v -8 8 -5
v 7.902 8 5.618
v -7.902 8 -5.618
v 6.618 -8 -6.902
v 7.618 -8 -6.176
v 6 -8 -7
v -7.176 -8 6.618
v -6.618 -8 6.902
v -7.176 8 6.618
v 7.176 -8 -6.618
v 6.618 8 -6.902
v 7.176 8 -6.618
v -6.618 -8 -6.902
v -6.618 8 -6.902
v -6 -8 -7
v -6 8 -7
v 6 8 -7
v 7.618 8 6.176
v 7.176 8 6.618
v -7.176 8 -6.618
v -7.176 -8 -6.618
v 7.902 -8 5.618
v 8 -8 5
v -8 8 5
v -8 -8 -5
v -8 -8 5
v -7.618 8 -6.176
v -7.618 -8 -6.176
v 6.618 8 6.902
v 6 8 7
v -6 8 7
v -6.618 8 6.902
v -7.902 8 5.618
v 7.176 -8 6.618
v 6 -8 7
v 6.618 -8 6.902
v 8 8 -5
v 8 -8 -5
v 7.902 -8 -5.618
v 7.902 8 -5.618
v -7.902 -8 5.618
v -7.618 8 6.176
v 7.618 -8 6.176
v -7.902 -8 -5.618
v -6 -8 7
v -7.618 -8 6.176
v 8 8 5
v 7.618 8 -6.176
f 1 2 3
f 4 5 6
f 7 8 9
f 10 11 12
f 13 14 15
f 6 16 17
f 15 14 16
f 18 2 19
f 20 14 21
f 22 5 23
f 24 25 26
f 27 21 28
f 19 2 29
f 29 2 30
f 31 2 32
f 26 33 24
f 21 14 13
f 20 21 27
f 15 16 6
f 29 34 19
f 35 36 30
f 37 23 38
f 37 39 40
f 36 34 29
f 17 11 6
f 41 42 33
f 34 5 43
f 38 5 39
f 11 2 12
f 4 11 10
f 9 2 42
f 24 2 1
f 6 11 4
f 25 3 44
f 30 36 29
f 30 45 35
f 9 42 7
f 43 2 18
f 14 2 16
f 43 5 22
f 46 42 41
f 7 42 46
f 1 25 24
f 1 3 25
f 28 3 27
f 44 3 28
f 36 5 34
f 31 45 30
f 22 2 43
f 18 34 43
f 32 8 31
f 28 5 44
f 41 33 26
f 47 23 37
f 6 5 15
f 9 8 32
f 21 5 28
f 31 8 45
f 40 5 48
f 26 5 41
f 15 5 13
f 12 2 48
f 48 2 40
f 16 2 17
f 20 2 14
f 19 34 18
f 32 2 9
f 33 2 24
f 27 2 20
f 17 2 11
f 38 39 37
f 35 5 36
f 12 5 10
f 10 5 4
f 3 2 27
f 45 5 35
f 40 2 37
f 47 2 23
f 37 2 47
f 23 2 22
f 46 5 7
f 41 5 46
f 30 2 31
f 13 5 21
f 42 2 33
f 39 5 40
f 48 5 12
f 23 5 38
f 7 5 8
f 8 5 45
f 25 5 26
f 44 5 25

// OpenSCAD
// file: ../../lib/pcb.scad
module prism(l, w, h) {
    translate([-0.5*l,0, -0.5*h])
    rotate([0,0,-90])
       polyhedron(points=[
               [0,0,h],           // 0    front top corner
               [0,0,0],[w,0,0],   // 1, 2 front left & right bottom corners
               [0,l,h],           // 3    back top corner
               [0,l,0],[w,l,0]    // 4, 5 back left & right bottom corners
       ], faces=[ // points for all faces must be ordered clockwise when looking in
               [0,2,1],    // top face
               [3,4,5],    // base face
               [0,1,4,3],  // h face
               [1,2,5,4],  // w face
               [0,3,5,2],  // hypotenuse face
       ]);
}

/*
module holder(holderLength, holderHeight, holderThickness, holderPrismWidth, holderPrismHeight, holderPlateHeight){
    translate([0,0, 0])
        cube([holderLength, holderThickness, holderHeight], center=true);
    
    translate([0, -0.5*(holderPrismWidth-holderThickness), 0.5*(holderHeight + holderPlateHeight)])
        cube([holderLength, holderPrismWidth, holderPlateHeight], center=true);

    translate([0, 0.5*holderThickness, 0.5*(holderHeight + holderPrismHeight) + holderPlateHeight]){
        prism(holderLength, holderPrismWidth, holderPrismHeight);
    }   
    
}
*/

module holder(holderLength, holderHeight, holderThickness, holderPrismWidth, holderPrismHeight, holderPlateHeight){
    translate([0,0, 0])
        cube([holderLength, holderThickness, holderHeight], center=true);
    
    translate([0, -0.5*(holderPrismWidth-holderThickness), 0.5*(holderHeight + holderPlateHeight)])
        cube([holderLength, holderPrismWidth, holderPlateHeight], center=true);
    
    translate([0,0.5*holderThickness, 0.5*(holderHeight)]){
        translate([0,0, holderPlateHeight + 0.5* + holderPrismHeight])
        prism(holderLength, holderPrismWidth, holderPrismHeight);
        
        
        translate([0, -holderThickness , -0.125*holderPrismHeight])
            rotate([0,180,0])
                prism(holderLength, holderPrismWidth-holderThickness, 0.25*holderPrismHeight);
    }   
    
}

module pcb(
    pcbDimensions = [30, 20, 3],
    holderThickness = 1.2,
    
    holderLength = 8,
    holderPlateHeight = 0.2,
    platerSize = 3,
    platerHeight = 2
){    
    holderPrismHeight = 1;
    holderPrismWidth = 0.5 * holderPrismHeight + holderThickness;
    holderHeight = pcbDimensions[2] + platerHeight;

    
        translate([0, 0.5 * (pcbDimensions[1] + holderThickness), 0.5*holderHeight]){
            holder(holderLength, holderHeight, holderThickness, holderPrismWidth, holderPrismHeight, holderPlateHeight);
        }   
        
        translate([0, -0.5 * (pcbDimensions[1] + holderThickness), 0.5*holderHeight]){
            rotate([0, 0, 180])
                holder(holderLength, holderHeight, holderThickness, holderPrismWidth, holderPrismHeight, holderPlateHeight);
        }
        
        translate([0.5*(pcbDimensions[0] + holderThickness), 0, 0.5*holderHeight]){
            rotate([0, 0, -90])
                holder(holderLength, holderHeight, holderThickness, holderPrismWidth, holderPrismHeight, holderPlateHeight);
        }
        
        translate([-0.5*(pcbDimensions[0] + holderThickness), 0, 0.5*holderHeight]){
            rotate([0, 0, 90]){
                holder(holderLength, holderHeight, holderThickness, holderPrismWidth, holderPrismHeight, holderPlateHeight);
            }
        }
        
        translate([-0.5 * (pcbDimensions[0] - platerSize) - holderThickness, 0.5 * (platerSize - pcbDimensions[1]) - holderThickness, 0.5*platerHeight]){
            cube([platerSize, platerSize, platerHeight], center=true);
        }
        
        translate([0.5 * (pcbDimensions[0] - platerSize) + holderThickness, 0.5 * (platerSize - pcbDimensions[1]) - holderThickness, 0.5*platerHeight]){
            cube([platerSize, platerSize, platerHeight], center=true);
        }
        
        translate([-0.5 * (pcbDimensions[0] - platerSize) - holderThickness, -0.5 * (platerSize - pcbDimensions[1]) + holderThickness, 0.5*platerHeight]){
            cube([platerSize, platerSize, platerHeight], center=true);
        }
        
        translate([0.5 * (pcbDimensions[0] - platerSize) + holderThickness, -0.5 * (platerSize - pcbDimensions[1]) + holderThickness, 0.5*platerHeight]){
            cube([platerSize, platerSize, platerHeight], center=true);
        }
    
}
// file: ../../lib/svg3d.scad
module svg3d(file, orgWidth, orgHeight, depth, size, center = true){
    translate([0, 0, -0.5*depth])
    //scale([size, size, 1])
        //surface(file = file, center = true, invert = true);
        
        
        linear_extrude(depth) {
            scale([size, size, 0])
            translate([-0.5*orgWidth, -0.5*orgHeight, 0])
                import(file);
        }
        
    
}
// file: ../../lib/text3d.scad
module text3d(text, textDepth, textSize, textFont, textSpacing, center = true){
    translate([0,0,-0.5*textDepth])
        linear_extrude(textDepth) {
            text(text, size = textSize, font = textFont, spacing = textSpacing, halign = "center", valign = "center", $fn = 64);
        }
}
// file: ../../lib/base.scad
use <shapes.scad>;

module base(
    objectSize, 
    height, 
    sideAdjustment, 
    baseRounding, 
    roundingRadius, 
    roundingResolution,
    withPit,
    pitWallThickness,
    pitDepth,
    pitWallGaps,
){
    //Variables for cutouts        
    cutOffset = 0.2;
    cutMultiplier = 1.1;
    cutTolerance = 0.01;

    //Object Size Adjusted      
    objectSizeXAdjusted = objectSize[0] + sideAdjustment[0] + sideAdjustment[1];
    objectSizeYAdjusted = objectSize[1] + sideAdjustment[2] + sideAdjustment[3];

    size = [objectSizeXAdjusted, objectSizeYAdjusted, height];

    function sideX(side) = 0.5 * (sideAdjustment[1] - sideAdjustment[0]) + (side - 0.5) * objectSizeXAdjusted;
    function sideY(side) = 0.5 * (sideAdjustment[3] - sideAdjustment[2]) + (side - 0.5) * objectSizeYAdjusted;

    difference(){
        translate([0.5*(sideAdjustment[1] - sideAdjustment[0]), 0.5*(sideAdjustment[3] - sideAdjustment[2]), 0]){
            if(baseRounding == "none"){
                cube(
                    size = size, 
                    center = true
                );    
            }
            else if(baseRounding == "all"){
                mb_roundedcube_simple(
                    size = size, 
                    center = true, 
                    radius = roundingRadius, 
                    resolution = roundingResolution
                );    
            }
            else{
                mb_roundedcube(
                    size = size, 
                    center = true, 
                    radius = roundingRadius, 
                    apply_to = baseRounding,
                    resolution = roundingResolution
                );
            }
        }

        /*
        * Pit
        */
        if(withPit){
            pitSizeX = objectSize[0] - pitWallThickness[0] - pitWallThickness[1];
            pitSizeY = objectSize[1] - pitWallThickness[2] - pitWallThickness[3];
            echo(pitSizeX = pitSizeX, pitSizeY = pitSizeY, pitDepth = pitDepth, pitWallThickness = pitWallThickness);

            translate([0.5*(pitWallThickness[1] - pitWallThickness[0]), 0.5*(pitWallThickness[3] - pitWallThickness[2]), 0.5 * (height - pitDepth) + 0.5 * cutOffset])
                cube([pitSizeX, pitSizeY, pitDepth + cutOffset], center = true);
        
            for (gapIndex = [ 0 : 1 : len(pitWallGaps)-1 ]){
                gap = pitWallGaps[gapIndex];
                if(gap[0] < 2){
                    translate([sideX(gap[0]), -0.5 * (gap[2] - gap[1]), 0.5*(height - pitDepth + cutOffset)])
                        cube([2*pitWallThickness[gap[0]]*cutMultiplier, pitSizeY - gap[1] - gap[2], pitDepth + cutOffset], center = true);
                }  
                else{
                    translate([-0.5 * (gap[2] - gap[1]), sideY(gap[0] - 2), 0.5*(height - pitDepth + cutOffset)])
                        cube([pitSizeX - gap[1] - gap[2] , 2*pitWallThickness[gap[0]]*cutMultiplier, pitDepth + cutOffset], center = true);     
                } 
            }
        }
    }
}
// file: ../../lib/shapes.scad
// More information: https://danielupshaw.com/openscad-rounded-corners/

// Set to 0.01 for higher definition curves (renders slower)
$fs = 0.15;

module mb_roundedcube(size = [1, 1, 1], center = false, radius = 0.5, apply_to = "all", resolution = 20) {
	// If single value, convert to [x, y, z] vector
	size = (size[0] == undef) ? [size, size, size] : size;

	translate_min = radius;
	translate_xmax = size[0] - radius;
	translate_ymax = size[1] - radius;
	translate_zmax = size[2] - radius;

	diameter = radius * 2;

	obj_translate = (center == false) ?
		[0, 0, 0] : [
			-(size[0] / 2),
			-(size[1] / 2),
			-(size[2] / 2)
		];

	translate(v = obj_translate) {
		hull() {
			for (translate_x = [translate_min, translate_xmax]) {
				x_at = (translate_x == translate_min) ? "min" : "max";
				for (translate_y = [translate_min, translate_ymax]) {
					y_at = (translate_y == translate_min) ? "min" : "max";
					for (translate_z = [translate_min, translate_zmax]) {
						z_at = (translate_z == translate_min) ? "min" : "max";

						translate(v = [translate_x, translate_y, translate_z])
						if (
							(apply_to == "all") ||
							(apply_to == "xmin" && x_at == "min") || (apply_to == "xmax" && x_at == "max") ||
							(apply_to == "ymin" && y_at == "min") || (apply_to == "ymax" && y_at == "max") ||
							(apply_to == "zmin" && z_at == "min") || (apply_to == "zmax" && z_at == "max")
						) {
							sphere(r = radius, $fn = resolution);
						} else {
							rotate = 
								(apply_to == "xmin" || apply_to == "xmax" || apply_to == "x") ? [0, 90, 0] : (
								(apply_to == "ymin" || apply_to == "ymax" || apply_to == "y") ? [90, 90, 0] :
								[0, 0, 0]
							);
							rotate(a = rotate)
							cylinder(h = diameter, r = radius, center = true, $fn = resolution);
						}
					}
				}
			}
		}
	}
}

module mb_roundedcube_simple(size = [1, 1, 1], center = false, radius = 0.5, resolution = 20) {
	// If single value, convert to [x, y, z] vector
	size = (size[0] == undef) ? [size, size, size] : size;

	translate = (center == false) ?
		[radius, radius, radius] :
		[
			radius - (size[0] / 2),
			radius - (size[1] / 2),
			radius - (size[2] / 2)
	];

	translate(v = translate)
	minkowski() {
		cube(size = [
			size[0] - (radius * 2),
			size[1] - (radius * 2),
			size[2] - (radius * 2)
		]);
		sphere(r = radius, $fn = resolution);
	}
}

module mb_torus(circleRadius, torusRadius, circleResolution = 30, torusResolution = 30){
    rotate_extrude(convexity = 10, $fn = torusResolution)
        translate([torusRadius - circleRadius, 0, 0])
            circle(r = circleRadius, $fn = circleResolution);
}
// main file
echo(version=version());

include <../../lib/block.scad>;

width = 16;
height = 14;
rounding=2;

mb_roundedcube([width, width, height], true, rounding, "y");
